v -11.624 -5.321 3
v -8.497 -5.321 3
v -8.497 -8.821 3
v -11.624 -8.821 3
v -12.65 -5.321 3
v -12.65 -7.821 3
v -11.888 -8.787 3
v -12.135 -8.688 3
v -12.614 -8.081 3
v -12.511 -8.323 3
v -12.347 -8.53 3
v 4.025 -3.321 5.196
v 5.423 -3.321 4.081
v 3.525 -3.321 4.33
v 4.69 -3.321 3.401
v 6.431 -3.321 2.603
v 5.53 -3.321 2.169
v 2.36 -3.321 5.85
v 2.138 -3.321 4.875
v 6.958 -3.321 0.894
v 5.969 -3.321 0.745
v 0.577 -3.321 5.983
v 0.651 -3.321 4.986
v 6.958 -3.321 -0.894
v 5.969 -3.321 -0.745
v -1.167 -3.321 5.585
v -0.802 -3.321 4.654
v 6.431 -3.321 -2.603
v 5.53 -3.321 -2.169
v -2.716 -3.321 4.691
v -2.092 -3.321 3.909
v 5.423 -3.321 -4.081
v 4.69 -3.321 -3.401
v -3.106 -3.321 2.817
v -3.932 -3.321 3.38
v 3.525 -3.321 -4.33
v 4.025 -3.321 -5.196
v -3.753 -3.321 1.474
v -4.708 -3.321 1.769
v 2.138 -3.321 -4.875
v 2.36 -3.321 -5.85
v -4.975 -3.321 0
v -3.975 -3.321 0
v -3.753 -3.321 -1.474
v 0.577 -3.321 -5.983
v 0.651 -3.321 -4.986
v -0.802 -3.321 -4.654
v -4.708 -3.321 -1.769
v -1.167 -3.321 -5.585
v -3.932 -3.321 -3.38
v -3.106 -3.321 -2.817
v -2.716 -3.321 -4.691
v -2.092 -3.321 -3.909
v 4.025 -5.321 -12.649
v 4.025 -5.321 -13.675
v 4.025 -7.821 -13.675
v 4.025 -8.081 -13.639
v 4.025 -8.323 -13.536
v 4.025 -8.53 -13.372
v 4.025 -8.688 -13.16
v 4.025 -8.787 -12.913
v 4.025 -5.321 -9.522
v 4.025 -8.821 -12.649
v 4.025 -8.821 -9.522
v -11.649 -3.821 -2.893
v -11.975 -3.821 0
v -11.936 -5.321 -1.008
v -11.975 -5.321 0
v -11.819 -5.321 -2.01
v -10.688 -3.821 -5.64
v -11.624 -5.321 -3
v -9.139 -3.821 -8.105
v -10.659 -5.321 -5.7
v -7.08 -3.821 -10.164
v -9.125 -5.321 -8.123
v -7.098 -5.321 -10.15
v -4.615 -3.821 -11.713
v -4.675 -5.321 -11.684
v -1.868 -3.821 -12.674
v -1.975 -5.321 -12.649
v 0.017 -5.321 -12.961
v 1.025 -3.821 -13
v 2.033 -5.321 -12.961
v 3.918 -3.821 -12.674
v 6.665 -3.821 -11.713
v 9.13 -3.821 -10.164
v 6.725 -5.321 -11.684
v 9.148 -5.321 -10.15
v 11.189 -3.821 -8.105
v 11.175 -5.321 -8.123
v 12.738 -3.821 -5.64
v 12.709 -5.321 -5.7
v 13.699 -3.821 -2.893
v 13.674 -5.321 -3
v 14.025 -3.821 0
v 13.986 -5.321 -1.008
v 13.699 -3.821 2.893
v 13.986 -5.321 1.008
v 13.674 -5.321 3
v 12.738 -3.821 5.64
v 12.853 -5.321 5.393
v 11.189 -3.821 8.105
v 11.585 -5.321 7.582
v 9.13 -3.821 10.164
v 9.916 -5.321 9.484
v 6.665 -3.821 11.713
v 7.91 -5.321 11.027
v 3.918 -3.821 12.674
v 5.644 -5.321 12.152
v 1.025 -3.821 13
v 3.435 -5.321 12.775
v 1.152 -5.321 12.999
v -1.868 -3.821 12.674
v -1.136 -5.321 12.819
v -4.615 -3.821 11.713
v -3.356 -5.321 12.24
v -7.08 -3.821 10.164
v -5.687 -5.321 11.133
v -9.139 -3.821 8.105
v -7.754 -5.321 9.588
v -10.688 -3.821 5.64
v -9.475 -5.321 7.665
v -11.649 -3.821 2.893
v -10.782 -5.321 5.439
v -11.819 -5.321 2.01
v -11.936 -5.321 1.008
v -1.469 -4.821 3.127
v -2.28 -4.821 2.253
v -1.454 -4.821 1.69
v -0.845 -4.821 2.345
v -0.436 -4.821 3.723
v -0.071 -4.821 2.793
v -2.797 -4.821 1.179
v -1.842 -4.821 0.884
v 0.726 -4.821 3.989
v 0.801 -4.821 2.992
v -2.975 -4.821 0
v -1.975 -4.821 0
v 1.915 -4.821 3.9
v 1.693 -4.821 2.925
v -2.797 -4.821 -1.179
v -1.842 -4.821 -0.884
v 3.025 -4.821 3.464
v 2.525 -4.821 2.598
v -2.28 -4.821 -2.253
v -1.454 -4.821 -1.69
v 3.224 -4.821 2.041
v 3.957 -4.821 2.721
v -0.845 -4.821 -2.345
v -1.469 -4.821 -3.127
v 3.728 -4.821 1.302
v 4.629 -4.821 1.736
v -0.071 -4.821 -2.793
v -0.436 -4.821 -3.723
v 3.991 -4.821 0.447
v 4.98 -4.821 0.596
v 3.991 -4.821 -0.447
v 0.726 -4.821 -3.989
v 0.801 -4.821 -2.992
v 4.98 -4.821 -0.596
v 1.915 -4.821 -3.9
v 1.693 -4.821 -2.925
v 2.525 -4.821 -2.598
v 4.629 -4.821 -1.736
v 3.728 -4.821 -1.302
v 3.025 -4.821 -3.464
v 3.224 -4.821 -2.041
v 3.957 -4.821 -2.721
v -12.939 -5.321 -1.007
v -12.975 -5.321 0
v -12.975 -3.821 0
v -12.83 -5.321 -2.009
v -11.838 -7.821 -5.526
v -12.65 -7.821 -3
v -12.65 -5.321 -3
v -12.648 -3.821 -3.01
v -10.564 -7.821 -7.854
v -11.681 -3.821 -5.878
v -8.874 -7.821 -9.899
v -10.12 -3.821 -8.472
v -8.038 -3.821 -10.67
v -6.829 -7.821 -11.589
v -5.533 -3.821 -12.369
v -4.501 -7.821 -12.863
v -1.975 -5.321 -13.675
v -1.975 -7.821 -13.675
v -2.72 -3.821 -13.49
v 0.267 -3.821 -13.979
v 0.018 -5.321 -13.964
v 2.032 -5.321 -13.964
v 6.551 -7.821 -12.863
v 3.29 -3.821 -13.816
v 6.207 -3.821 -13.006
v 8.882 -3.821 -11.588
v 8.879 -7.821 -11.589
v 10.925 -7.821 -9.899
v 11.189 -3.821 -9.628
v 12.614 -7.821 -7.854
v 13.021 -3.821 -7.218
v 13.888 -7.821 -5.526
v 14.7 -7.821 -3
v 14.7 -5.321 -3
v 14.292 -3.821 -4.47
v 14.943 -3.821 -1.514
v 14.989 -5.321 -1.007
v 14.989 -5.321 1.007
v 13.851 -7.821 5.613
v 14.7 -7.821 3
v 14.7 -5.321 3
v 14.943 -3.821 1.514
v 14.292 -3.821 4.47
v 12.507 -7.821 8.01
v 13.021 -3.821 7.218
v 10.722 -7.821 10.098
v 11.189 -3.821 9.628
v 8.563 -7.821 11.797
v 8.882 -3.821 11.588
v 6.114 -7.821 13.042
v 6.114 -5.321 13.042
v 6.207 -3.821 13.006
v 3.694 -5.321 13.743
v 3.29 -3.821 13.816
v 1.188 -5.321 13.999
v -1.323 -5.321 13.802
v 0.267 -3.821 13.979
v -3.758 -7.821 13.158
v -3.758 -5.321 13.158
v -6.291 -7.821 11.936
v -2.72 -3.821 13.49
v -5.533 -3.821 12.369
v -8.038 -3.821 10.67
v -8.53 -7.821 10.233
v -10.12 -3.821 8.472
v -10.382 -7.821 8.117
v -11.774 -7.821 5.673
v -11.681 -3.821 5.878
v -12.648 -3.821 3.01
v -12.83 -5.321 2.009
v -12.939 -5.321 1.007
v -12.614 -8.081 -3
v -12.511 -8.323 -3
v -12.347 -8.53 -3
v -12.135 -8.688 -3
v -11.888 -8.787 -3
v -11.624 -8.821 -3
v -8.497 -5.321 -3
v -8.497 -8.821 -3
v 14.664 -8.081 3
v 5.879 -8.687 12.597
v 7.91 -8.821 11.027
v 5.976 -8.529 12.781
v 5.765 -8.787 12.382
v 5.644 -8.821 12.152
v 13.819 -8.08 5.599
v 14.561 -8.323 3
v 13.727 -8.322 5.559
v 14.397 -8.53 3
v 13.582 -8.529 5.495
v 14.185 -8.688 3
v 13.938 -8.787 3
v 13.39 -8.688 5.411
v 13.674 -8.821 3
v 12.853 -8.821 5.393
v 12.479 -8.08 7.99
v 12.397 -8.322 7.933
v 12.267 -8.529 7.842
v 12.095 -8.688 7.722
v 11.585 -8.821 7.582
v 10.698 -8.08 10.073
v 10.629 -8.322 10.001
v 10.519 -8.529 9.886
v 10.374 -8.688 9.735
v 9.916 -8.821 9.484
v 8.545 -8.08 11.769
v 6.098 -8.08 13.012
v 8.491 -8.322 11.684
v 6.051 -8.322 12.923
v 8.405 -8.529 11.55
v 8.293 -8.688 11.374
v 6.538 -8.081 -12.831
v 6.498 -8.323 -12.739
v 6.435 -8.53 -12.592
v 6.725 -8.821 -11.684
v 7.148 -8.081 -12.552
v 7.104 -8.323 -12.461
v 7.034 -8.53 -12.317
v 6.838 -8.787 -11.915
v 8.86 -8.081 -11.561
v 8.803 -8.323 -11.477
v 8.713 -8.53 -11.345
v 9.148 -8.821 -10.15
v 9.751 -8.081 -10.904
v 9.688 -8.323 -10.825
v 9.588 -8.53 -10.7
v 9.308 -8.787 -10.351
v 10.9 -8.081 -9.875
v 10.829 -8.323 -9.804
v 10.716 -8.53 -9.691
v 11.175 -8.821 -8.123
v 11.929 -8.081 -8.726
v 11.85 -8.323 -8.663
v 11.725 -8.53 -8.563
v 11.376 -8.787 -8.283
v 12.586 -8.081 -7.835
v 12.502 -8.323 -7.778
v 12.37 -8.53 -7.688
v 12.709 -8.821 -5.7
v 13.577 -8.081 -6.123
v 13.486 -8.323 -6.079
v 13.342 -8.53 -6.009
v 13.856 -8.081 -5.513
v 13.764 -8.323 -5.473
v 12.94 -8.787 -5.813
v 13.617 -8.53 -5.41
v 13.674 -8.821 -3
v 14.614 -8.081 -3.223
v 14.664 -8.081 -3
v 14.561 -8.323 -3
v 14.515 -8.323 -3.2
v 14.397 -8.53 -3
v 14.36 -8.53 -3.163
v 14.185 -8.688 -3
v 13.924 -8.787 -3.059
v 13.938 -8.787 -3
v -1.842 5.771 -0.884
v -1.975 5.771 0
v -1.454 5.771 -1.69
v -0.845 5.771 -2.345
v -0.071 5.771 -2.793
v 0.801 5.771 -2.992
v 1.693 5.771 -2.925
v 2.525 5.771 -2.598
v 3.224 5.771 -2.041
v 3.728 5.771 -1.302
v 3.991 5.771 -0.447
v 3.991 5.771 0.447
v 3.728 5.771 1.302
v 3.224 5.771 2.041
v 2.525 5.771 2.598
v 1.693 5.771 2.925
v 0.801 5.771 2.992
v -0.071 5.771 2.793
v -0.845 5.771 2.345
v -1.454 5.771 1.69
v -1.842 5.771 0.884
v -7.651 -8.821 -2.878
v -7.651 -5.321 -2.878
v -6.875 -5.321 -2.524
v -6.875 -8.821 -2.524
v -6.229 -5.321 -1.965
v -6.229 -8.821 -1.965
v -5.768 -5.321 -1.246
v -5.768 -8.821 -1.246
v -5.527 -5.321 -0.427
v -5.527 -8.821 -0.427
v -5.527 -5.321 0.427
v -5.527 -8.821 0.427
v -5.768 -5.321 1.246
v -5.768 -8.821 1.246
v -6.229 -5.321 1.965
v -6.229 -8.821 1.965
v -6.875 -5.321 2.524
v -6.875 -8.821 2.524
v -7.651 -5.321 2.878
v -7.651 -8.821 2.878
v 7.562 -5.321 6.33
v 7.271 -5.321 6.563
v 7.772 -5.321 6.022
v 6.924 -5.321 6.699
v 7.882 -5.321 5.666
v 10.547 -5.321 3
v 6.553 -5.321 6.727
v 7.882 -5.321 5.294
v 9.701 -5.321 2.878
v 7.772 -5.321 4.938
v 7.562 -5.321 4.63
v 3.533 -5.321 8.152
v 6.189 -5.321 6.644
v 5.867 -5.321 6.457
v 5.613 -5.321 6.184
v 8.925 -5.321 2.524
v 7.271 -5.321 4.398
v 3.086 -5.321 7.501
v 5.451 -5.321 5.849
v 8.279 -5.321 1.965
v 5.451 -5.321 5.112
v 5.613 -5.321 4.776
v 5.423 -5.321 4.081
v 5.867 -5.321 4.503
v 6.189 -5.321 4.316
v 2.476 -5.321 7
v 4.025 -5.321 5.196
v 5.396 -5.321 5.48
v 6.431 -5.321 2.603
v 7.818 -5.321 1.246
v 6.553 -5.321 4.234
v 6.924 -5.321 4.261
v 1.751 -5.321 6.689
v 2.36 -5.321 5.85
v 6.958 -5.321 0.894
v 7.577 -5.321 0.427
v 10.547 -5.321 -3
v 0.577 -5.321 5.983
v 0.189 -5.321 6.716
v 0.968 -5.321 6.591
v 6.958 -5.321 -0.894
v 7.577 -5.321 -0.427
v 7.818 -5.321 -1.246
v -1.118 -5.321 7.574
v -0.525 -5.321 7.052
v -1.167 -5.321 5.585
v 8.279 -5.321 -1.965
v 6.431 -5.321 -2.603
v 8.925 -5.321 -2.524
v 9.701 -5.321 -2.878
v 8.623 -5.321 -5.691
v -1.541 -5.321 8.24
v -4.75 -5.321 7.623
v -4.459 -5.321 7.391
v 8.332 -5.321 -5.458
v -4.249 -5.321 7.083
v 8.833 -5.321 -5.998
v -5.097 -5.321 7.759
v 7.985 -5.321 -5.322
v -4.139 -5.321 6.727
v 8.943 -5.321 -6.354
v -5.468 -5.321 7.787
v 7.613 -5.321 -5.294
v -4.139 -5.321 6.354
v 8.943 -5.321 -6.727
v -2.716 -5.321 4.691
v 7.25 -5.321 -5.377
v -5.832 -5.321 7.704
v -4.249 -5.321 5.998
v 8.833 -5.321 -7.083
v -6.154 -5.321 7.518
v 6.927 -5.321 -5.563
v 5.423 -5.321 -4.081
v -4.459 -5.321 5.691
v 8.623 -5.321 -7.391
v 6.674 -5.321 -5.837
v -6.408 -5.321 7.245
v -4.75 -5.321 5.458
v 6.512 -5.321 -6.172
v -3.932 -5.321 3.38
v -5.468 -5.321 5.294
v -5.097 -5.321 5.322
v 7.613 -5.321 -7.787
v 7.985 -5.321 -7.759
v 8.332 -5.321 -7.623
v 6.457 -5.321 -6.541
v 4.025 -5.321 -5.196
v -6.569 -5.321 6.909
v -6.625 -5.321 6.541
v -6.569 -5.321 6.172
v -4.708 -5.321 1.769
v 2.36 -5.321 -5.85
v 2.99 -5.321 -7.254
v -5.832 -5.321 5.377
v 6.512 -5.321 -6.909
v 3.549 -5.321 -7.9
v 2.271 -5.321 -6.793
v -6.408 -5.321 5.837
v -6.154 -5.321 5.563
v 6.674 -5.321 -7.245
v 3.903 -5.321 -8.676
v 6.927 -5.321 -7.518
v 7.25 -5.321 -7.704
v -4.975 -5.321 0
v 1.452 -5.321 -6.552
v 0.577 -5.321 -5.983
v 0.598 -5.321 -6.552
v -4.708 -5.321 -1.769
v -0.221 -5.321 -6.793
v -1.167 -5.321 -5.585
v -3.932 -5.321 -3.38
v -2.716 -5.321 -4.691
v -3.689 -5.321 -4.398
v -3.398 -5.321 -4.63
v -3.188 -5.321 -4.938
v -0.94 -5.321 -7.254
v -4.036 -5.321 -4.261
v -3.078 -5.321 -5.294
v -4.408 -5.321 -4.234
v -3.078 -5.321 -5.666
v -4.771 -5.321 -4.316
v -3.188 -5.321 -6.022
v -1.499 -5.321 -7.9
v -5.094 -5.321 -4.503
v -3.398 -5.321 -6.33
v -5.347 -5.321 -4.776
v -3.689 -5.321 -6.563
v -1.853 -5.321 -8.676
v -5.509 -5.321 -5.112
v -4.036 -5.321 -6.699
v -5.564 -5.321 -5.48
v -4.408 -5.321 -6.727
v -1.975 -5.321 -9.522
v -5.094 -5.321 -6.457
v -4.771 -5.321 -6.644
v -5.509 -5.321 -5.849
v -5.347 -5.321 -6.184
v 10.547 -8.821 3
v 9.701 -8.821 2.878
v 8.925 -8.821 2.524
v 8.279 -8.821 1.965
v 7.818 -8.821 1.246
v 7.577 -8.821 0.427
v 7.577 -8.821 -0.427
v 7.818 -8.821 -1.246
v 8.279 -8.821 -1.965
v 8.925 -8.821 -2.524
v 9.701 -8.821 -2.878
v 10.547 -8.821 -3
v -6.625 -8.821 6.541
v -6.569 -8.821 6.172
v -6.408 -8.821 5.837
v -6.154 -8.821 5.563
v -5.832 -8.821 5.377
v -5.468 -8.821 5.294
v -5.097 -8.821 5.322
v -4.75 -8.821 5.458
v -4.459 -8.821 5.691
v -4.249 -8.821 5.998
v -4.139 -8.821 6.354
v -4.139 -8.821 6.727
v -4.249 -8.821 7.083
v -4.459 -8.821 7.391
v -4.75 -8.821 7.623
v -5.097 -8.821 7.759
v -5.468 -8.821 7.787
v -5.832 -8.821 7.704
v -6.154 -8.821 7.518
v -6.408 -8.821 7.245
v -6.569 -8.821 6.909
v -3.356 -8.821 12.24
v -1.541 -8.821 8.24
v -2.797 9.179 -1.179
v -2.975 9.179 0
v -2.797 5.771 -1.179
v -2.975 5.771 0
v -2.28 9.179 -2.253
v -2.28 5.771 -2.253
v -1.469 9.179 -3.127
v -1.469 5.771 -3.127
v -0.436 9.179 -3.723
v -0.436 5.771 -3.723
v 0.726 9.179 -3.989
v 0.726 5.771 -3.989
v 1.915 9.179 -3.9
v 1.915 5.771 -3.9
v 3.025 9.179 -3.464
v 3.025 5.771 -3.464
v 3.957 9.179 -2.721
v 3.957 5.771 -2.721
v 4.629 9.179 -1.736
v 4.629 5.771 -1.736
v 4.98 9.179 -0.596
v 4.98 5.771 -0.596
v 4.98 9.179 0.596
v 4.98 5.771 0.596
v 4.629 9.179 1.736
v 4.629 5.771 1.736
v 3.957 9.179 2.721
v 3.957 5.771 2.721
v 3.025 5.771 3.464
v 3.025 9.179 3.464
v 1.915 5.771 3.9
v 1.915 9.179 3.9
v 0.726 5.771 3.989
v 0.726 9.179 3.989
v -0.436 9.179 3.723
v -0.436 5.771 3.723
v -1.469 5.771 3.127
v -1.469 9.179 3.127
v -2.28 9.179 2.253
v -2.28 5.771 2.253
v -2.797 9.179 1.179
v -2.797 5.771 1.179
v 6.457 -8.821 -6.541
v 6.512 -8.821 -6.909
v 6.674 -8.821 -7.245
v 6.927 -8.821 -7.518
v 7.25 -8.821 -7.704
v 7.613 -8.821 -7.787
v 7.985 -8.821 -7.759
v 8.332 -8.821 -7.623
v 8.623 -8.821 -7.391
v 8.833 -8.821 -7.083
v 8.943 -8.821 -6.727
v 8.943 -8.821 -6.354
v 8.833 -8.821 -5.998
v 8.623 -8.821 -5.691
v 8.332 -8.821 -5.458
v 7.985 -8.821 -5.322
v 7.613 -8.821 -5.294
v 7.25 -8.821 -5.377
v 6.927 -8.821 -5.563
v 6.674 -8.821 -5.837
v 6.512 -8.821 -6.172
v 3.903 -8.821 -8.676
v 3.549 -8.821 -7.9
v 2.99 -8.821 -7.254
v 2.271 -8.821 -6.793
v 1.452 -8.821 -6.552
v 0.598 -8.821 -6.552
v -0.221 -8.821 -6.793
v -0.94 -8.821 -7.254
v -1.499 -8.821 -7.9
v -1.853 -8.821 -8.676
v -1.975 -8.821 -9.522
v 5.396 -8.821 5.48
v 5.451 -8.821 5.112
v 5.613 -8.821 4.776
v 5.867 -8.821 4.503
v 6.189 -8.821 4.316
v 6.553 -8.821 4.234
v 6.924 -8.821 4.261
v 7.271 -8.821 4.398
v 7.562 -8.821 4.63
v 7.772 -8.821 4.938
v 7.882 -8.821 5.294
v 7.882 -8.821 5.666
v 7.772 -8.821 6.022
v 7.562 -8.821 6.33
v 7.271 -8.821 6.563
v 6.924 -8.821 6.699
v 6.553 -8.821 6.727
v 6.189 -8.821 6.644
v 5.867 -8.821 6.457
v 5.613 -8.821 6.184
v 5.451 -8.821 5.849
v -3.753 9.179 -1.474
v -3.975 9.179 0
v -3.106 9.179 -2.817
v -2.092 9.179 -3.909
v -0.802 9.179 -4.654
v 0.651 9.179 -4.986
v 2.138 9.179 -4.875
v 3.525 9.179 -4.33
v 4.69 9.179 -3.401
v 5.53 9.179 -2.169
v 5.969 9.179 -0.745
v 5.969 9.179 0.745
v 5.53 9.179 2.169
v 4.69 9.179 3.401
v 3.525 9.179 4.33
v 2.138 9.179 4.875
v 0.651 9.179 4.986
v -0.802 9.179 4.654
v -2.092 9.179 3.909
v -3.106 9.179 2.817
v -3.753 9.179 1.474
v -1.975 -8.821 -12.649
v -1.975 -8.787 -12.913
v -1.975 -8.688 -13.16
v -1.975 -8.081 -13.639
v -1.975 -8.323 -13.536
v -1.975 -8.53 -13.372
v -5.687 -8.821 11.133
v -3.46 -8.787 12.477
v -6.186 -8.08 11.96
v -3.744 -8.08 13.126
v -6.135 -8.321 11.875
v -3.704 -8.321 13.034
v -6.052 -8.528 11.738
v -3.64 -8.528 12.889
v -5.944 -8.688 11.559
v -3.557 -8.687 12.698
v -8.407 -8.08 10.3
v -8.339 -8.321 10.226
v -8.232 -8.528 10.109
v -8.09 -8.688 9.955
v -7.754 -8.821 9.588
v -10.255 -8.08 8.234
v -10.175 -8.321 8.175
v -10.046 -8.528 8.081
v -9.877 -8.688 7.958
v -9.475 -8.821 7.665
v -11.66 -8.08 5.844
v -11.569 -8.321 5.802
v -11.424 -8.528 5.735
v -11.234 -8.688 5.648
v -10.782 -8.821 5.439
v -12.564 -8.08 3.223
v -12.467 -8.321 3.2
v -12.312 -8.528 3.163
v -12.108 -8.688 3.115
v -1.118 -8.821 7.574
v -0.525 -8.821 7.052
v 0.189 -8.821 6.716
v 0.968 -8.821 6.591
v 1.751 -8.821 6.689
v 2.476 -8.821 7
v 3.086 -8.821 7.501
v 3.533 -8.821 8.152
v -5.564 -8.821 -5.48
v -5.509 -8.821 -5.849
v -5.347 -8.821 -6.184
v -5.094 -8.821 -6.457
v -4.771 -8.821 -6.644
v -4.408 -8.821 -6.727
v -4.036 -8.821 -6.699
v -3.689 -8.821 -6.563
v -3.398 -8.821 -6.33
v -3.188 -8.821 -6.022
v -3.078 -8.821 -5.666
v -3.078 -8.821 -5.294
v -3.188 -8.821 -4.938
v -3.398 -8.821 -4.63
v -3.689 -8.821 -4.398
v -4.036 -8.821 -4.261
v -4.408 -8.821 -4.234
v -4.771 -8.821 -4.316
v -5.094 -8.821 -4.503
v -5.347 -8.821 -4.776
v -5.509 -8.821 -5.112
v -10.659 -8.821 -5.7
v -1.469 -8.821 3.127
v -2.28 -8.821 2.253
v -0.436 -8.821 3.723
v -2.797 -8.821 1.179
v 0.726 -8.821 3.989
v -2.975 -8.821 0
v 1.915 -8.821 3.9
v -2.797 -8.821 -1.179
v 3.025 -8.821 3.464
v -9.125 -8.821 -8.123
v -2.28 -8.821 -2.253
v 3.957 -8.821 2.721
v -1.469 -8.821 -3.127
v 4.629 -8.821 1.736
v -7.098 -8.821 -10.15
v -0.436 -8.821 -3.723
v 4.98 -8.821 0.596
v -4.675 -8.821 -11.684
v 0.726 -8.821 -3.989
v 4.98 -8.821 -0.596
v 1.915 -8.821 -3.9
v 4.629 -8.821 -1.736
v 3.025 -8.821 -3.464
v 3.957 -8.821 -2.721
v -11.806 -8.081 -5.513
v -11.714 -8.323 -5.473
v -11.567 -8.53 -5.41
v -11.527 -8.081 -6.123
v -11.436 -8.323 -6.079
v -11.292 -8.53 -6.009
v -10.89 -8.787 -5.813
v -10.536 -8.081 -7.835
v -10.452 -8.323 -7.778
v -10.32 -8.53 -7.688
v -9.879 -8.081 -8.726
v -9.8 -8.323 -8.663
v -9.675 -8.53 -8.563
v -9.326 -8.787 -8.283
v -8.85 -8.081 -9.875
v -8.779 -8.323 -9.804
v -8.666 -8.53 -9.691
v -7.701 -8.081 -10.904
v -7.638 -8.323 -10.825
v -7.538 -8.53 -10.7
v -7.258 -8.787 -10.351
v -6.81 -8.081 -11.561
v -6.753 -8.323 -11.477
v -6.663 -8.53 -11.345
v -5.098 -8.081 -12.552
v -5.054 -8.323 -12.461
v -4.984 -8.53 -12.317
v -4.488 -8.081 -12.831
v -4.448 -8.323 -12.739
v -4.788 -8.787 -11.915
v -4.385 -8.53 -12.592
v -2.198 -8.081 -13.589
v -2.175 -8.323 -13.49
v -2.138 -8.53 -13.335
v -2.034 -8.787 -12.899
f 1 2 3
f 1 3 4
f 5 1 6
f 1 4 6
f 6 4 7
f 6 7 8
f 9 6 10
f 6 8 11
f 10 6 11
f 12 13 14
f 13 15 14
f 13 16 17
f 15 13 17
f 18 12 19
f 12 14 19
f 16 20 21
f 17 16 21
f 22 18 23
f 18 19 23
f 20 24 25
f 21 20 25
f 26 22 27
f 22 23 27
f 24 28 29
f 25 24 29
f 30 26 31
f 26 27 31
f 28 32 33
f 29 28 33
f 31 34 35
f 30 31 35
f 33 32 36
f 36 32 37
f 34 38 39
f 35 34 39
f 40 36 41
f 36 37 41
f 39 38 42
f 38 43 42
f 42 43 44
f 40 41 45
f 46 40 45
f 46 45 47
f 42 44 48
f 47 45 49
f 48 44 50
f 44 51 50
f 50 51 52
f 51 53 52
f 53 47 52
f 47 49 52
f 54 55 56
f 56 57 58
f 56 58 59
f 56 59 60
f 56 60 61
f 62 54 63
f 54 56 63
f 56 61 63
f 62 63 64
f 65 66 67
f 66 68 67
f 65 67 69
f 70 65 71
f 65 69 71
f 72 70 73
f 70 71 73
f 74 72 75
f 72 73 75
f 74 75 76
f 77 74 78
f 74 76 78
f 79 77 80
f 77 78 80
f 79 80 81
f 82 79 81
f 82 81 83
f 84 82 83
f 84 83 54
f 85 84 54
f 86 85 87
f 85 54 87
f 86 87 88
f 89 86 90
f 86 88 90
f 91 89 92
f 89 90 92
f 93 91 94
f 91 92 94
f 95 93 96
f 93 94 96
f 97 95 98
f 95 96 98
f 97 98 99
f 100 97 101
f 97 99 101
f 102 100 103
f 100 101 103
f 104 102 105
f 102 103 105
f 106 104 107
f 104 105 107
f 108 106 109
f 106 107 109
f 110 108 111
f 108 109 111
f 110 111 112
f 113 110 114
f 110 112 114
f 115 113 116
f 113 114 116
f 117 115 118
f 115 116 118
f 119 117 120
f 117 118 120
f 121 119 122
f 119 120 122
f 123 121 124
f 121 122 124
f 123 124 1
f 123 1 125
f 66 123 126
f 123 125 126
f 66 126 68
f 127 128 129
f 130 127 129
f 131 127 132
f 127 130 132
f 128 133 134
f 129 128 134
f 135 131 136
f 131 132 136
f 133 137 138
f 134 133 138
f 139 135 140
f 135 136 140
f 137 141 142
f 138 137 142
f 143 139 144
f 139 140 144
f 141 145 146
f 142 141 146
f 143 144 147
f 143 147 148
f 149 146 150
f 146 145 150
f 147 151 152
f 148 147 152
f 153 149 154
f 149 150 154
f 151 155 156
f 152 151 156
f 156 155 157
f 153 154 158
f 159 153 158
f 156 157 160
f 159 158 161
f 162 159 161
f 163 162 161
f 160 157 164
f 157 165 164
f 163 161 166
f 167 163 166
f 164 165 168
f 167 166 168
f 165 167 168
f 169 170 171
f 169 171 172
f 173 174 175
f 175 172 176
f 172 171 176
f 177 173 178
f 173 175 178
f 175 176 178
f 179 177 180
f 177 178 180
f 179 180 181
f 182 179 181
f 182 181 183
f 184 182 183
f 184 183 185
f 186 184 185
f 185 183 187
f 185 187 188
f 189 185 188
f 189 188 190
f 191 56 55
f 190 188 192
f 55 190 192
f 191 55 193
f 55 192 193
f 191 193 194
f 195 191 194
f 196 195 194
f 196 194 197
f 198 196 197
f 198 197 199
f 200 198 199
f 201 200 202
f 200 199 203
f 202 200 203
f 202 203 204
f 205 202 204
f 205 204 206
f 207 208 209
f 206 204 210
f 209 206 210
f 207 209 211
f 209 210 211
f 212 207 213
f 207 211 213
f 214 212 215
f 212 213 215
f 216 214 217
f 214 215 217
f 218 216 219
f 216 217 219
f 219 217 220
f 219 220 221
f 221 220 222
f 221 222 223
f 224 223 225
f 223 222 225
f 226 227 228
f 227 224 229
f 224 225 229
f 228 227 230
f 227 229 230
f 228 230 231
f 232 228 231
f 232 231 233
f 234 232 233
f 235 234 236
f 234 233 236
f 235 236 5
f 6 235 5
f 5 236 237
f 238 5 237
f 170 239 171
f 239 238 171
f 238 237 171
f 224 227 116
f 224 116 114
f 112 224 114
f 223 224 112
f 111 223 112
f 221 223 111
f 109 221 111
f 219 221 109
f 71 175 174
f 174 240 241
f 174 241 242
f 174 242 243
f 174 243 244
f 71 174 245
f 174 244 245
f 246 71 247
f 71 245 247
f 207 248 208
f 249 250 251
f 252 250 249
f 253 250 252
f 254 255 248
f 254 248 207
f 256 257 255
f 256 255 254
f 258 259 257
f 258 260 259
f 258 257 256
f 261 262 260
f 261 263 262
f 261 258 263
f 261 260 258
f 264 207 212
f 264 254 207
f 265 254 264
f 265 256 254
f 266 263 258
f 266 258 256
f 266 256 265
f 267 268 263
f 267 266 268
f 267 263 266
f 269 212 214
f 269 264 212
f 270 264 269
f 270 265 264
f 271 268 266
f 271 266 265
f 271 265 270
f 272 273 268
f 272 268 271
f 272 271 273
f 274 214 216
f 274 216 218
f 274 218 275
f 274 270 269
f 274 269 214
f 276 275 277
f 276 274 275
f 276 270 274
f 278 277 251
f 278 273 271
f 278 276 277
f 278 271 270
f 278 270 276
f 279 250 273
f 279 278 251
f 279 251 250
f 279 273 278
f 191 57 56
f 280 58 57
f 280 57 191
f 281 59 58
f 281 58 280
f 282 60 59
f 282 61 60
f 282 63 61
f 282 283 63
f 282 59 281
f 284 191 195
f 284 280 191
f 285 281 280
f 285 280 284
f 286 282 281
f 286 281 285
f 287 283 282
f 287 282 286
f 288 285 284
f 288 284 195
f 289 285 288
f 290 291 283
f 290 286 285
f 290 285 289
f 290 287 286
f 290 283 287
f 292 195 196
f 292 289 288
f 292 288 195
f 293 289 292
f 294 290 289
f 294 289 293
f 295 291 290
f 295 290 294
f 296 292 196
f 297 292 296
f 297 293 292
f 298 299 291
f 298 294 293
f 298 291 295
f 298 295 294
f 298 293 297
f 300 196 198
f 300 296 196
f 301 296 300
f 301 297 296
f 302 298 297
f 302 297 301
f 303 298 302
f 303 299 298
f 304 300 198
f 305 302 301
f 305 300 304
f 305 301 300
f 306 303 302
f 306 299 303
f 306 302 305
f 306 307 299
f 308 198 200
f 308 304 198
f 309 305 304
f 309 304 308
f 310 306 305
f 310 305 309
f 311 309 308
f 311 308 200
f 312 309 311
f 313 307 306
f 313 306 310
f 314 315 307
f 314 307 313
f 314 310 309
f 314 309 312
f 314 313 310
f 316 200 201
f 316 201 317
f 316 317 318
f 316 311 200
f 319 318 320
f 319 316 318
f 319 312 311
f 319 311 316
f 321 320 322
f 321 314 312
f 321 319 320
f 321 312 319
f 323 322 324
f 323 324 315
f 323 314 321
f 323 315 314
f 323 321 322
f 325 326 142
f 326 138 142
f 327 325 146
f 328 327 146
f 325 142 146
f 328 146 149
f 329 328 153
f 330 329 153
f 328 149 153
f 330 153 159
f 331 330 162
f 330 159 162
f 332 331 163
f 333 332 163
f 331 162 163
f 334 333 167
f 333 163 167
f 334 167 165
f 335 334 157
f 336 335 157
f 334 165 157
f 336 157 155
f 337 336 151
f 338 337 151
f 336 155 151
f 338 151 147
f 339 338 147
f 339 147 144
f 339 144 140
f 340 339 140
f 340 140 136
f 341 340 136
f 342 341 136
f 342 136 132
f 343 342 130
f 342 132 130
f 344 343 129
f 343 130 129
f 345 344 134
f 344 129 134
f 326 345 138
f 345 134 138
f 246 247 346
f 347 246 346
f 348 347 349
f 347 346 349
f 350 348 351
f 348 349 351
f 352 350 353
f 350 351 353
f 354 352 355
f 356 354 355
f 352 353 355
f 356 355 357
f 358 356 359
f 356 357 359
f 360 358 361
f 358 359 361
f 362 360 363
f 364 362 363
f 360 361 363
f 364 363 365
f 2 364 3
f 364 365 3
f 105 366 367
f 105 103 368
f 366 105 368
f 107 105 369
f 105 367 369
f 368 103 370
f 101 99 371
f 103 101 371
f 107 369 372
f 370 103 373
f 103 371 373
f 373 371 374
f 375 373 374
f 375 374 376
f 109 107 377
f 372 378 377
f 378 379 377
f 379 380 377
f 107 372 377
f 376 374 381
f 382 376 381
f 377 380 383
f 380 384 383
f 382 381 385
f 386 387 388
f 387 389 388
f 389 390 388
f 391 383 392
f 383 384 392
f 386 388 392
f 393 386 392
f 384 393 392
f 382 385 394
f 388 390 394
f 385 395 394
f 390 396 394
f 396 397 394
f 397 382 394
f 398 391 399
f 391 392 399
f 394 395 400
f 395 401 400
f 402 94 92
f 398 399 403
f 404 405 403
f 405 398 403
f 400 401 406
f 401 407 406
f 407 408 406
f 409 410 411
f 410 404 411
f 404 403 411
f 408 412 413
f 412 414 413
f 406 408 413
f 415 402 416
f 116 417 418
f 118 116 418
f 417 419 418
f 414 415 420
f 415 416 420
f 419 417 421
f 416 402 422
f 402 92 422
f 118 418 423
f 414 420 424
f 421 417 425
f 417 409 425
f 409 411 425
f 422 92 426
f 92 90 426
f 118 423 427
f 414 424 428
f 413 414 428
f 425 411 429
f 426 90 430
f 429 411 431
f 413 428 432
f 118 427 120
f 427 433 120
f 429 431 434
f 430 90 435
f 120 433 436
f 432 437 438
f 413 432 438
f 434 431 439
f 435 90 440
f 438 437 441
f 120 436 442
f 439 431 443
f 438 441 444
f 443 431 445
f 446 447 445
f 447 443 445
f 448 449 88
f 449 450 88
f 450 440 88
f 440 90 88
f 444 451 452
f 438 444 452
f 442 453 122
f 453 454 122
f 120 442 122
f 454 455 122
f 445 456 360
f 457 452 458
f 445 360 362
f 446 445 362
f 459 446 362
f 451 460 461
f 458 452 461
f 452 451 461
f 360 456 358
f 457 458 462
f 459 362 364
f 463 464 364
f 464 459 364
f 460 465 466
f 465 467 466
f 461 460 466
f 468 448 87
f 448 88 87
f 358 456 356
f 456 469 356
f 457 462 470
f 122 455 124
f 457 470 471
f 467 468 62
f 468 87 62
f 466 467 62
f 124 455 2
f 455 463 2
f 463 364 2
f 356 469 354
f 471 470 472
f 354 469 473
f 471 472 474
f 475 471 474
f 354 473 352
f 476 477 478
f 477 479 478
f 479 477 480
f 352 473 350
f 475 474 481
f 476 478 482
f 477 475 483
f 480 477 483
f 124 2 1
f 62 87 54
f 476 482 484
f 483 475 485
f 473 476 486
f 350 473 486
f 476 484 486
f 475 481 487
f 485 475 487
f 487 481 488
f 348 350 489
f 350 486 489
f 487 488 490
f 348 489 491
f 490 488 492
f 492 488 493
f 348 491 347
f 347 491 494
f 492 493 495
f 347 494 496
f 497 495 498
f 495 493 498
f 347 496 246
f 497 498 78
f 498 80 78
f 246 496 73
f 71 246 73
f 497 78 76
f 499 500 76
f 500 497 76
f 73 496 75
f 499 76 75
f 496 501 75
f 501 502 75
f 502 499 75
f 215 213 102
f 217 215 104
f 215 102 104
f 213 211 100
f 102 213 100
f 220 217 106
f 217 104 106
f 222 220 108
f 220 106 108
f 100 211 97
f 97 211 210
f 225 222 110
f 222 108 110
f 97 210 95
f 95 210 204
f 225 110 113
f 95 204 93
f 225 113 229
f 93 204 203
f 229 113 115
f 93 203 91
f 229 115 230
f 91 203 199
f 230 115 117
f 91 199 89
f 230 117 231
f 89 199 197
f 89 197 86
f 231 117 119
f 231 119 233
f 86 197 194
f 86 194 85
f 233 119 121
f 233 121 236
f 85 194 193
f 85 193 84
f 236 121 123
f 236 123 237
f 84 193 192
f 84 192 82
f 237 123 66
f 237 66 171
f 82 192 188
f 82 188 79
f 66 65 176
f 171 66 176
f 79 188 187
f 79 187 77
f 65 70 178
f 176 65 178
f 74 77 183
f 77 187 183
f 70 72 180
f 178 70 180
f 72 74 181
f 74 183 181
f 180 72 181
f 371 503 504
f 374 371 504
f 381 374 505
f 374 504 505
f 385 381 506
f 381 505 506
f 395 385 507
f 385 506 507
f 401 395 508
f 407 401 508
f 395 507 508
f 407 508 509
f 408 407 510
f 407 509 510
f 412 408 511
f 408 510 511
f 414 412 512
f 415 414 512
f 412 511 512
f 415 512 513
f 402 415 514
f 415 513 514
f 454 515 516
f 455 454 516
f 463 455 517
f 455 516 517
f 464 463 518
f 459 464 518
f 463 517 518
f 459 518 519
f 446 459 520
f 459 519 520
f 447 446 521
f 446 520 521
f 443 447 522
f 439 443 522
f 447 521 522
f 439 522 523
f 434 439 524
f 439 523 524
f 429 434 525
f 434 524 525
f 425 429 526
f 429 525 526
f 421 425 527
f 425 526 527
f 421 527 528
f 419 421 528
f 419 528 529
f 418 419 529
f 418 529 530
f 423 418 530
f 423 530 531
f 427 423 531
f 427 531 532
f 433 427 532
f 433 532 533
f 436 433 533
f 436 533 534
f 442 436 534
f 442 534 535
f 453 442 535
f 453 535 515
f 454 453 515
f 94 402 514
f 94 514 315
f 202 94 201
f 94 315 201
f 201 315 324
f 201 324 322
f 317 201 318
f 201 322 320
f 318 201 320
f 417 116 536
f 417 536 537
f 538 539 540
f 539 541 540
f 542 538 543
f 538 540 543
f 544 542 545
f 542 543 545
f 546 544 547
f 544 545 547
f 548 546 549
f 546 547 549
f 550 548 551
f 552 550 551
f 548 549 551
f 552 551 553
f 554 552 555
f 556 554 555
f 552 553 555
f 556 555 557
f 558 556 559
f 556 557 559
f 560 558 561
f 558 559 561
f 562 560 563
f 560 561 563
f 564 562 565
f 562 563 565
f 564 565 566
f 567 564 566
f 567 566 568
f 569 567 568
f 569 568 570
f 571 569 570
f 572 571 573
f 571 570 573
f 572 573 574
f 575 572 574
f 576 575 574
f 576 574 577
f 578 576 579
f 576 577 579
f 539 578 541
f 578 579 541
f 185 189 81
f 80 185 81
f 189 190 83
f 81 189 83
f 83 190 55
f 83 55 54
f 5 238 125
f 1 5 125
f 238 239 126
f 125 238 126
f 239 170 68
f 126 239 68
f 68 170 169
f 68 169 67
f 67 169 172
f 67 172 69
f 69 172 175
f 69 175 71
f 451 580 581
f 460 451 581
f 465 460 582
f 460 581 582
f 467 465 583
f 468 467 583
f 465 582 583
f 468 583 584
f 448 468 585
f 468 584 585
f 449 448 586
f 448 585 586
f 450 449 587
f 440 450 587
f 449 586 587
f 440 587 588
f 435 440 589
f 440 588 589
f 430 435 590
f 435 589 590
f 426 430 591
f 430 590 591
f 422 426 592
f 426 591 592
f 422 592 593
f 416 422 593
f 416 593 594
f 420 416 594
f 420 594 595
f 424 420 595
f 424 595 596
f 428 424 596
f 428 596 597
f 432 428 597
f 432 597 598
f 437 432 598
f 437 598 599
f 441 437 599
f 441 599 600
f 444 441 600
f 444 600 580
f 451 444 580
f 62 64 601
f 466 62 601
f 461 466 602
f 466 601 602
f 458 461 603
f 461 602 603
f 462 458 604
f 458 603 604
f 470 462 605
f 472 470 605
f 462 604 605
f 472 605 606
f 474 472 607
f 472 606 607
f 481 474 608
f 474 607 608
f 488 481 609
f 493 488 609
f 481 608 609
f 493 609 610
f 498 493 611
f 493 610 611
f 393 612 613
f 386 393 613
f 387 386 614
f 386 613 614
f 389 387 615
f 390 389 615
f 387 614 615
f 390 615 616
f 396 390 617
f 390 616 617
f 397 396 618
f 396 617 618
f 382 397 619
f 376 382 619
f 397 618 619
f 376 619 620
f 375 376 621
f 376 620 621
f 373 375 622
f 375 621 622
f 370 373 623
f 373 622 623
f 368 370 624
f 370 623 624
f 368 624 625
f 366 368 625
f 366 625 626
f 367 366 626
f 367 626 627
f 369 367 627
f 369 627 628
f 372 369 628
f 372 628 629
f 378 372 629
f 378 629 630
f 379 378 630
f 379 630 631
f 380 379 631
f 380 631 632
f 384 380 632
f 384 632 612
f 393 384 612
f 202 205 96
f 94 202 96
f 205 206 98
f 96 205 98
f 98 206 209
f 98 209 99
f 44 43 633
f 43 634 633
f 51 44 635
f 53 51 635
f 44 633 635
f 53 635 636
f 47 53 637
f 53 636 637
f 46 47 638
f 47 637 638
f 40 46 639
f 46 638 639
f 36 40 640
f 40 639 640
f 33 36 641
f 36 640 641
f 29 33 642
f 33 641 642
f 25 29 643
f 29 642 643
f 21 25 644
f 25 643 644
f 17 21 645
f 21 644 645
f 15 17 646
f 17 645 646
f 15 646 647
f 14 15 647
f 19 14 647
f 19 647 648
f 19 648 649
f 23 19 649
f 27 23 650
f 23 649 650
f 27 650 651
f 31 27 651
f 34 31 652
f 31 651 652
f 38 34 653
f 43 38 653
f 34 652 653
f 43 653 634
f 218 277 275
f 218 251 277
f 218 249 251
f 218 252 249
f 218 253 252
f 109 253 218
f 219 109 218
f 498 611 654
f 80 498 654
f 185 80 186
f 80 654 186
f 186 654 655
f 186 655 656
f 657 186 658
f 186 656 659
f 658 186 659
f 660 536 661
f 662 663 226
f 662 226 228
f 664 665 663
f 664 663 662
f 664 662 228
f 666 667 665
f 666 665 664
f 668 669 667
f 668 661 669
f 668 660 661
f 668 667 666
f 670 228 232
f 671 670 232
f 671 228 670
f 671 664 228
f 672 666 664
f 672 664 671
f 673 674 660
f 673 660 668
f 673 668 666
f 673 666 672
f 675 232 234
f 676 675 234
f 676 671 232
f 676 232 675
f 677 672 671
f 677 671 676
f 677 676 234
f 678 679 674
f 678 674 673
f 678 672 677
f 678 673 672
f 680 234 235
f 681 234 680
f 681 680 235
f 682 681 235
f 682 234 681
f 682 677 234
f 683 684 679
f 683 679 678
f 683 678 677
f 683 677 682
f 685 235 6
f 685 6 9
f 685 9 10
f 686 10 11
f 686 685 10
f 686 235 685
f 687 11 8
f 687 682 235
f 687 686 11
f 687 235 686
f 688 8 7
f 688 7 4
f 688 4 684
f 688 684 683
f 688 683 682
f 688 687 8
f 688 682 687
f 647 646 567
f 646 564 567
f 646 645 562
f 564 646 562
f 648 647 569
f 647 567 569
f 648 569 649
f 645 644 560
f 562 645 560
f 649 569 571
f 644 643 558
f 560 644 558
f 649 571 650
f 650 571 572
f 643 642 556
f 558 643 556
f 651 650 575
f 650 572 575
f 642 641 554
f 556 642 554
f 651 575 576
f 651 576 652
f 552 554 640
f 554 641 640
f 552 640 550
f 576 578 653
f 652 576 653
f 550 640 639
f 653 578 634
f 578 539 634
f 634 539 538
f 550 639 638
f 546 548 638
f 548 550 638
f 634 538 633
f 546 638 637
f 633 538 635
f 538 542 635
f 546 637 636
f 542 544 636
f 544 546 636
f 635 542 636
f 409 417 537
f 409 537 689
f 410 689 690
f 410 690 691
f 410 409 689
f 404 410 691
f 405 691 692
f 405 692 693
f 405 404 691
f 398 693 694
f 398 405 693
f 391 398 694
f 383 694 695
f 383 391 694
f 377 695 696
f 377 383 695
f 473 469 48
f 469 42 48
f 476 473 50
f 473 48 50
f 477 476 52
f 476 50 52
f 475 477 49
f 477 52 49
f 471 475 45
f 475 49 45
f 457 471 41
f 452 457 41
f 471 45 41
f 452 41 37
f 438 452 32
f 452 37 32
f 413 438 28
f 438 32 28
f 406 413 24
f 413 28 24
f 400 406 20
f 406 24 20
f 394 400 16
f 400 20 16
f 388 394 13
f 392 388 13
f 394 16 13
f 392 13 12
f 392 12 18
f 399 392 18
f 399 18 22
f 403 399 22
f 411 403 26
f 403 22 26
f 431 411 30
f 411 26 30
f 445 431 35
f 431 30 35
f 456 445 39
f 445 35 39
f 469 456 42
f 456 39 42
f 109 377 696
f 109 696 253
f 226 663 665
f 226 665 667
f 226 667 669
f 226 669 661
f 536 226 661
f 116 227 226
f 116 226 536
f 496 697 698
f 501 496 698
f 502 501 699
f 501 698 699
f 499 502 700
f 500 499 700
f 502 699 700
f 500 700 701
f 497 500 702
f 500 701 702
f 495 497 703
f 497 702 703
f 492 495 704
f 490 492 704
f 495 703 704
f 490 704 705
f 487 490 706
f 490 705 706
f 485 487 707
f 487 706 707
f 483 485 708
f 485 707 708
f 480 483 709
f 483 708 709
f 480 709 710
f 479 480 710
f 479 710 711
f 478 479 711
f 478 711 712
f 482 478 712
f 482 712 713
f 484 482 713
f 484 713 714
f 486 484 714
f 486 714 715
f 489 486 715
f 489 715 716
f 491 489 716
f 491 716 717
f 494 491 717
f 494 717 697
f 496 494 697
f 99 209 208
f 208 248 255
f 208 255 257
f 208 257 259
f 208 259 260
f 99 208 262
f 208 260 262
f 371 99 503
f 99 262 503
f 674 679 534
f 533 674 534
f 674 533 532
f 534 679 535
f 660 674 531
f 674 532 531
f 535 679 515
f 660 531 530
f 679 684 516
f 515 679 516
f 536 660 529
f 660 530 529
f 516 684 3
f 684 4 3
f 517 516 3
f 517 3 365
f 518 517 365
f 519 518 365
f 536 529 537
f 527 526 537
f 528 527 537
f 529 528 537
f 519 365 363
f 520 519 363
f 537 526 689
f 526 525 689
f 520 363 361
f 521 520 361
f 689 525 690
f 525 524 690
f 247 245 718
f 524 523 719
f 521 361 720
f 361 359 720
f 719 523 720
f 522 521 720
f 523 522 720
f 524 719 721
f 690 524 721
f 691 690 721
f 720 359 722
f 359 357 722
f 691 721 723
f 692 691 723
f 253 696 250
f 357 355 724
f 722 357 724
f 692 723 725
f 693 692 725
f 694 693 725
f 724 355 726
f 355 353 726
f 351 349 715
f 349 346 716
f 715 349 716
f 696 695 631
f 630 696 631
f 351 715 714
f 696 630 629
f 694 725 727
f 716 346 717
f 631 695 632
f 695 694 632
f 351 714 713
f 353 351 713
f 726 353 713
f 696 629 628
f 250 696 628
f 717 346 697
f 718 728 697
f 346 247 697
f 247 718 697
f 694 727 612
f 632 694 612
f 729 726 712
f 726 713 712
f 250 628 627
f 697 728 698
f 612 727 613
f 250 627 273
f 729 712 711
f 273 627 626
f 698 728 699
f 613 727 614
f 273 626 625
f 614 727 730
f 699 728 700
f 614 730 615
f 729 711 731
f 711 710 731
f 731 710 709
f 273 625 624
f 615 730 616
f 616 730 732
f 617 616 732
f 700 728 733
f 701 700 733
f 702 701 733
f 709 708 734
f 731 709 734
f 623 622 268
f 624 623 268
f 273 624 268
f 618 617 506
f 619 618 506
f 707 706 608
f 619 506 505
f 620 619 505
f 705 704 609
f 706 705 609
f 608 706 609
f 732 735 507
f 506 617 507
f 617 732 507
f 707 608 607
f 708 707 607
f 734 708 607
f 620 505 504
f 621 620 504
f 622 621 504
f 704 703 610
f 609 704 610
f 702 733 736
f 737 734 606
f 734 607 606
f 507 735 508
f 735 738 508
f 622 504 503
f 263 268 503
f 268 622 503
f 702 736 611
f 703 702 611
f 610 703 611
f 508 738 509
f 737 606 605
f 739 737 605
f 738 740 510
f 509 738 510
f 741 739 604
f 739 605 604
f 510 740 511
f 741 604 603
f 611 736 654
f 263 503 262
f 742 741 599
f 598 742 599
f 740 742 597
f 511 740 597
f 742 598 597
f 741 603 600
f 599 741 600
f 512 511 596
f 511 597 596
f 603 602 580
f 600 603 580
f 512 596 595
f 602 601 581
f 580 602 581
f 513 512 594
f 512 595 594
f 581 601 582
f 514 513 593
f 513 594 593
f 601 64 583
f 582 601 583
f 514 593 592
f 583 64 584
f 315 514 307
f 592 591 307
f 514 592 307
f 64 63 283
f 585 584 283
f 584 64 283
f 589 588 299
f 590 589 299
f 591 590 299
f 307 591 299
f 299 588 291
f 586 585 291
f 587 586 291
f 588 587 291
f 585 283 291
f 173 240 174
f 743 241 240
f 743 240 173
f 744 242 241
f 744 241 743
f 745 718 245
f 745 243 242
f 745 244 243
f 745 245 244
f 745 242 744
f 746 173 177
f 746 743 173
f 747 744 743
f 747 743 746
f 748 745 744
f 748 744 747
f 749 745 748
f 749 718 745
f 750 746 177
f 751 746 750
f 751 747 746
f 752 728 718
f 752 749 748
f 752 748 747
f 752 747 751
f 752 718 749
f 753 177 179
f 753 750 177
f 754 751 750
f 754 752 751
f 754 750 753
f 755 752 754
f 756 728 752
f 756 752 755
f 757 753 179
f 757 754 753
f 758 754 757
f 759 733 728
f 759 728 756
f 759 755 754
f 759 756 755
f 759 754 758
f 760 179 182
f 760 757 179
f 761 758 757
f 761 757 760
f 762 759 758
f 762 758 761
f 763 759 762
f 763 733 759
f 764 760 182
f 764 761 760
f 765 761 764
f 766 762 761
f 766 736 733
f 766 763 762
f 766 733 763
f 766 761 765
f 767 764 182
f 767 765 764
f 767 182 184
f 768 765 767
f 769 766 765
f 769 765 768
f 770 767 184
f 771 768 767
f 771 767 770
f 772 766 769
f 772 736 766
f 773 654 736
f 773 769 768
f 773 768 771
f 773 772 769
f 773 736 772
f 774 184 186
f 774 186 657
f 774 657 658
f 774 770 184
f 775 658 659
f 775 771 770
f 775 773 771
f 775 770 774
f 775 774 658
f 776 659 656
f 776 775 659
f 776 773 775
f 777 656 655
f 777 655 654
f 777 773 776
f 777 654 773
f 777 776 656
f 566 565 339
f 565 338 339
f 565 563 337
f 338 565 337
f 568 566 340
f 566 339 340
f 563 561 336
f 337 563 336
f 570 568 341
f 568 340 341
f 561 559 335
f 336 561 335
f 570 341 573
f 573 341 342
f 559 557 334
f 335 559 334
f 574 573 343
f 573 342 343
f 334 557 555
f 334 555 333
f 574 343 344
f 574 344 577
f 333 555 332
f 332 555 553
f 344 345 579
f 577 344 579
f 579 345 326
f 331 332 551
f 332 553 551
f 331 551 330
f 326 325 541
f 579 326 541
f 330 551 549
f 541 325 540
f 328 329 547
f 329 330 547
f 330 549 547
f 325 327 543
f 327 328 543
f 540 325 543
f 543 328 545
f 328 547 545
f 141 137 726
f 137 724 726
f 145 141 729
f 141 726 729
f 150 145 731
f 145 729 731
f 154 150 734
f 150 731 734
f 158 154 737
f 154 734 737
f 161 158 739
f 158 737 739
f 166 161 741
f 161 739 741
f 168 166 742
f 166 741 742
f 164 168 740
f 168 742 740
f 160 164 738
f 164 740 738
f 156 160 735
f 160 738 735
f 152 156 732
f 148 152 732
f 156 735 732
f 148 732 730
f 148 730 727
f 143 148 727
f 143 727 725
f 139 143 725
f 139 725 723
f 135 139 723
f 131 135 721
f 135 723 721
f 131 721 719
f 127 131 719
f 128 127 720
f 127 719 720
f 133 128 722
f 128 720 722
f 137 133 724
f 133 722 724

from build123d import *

# Parameters (mm, degrees)
CONG_1_R                     = 1
ENL_V_MAT_EXTRU_1_REACH      = 29.308
R_P_TITION_CIRCULAIRE2_COUNT = 3
R_P_TITION_CIRCULAIRE2_ANGLE = 180
ENL_V_START                  = -3.5
ENL_V_MAT_EXTRU_2_DEPTH      = 3.5
TROU_TARAUD_M3X0_52_D        = 2.5


with BuildPart() as part:
    # Esquisse3 → Révolution1 (revolve)
    with BuildSketch(Plane.XY):
        Polygon((-12.974994046, -8.820980619), (-12.974994046, -3.820980619), (-11.974994046, -3.820980619), (-11.974994046, -5.320980619), (-4.974994046, -5.320980619), (-4.974994046, -3.320980619), (-3.974994046, -3.320980619), (-3.974994046, 9.179019381), (-2.974994046, 9.179019381), (-2.974994046, 5.770549628), (-1.974994046, 5.770549628), (-1.974994046, -4.820980619), (-2.974994046, -4.820980619), (-2.974994046, -8.820980619), align=None)
    revolve(axis=Axis((1.025005954, 13.743921907, 0), (0, -1, 0)))

    # Congé1
    cong_1_edges = [part.edges().sort_by_distance(p)[0] for p in [
        (15.025005954, -8.820980619, 0),
    ]]
    fillet(cong_1_edges, radius=CONG_1_R)

    # Enlèv. mat.-Extru.1: up to this face of the body (flat: up to its plane)
    enl_v_mat_extru_1_end = Plane(part.part.faces().sort_by_distance((13.657310428, -5.320980619, 0))[0])
    # Esquisse5 → Enlèv. mat.-Extru.1 (cut, up to the picked face)
    with BuildSketch(Plane.XZ.offset(8.820980619), mode=Mode.PRIVATE) as enl_v_mat_extru_1_sk1:
        with BuildLine():
            Line((13.674116595, 3), (10.546683691, 3))
            ThreePointArc((10.546683691, 3), (7.546683691, 0), (10.546683691, -3))
            Line((10.546683691, -3), (13.674116595, -3))
            Line((13.674116595, -3), (14.699800285, -3))
            Line((14.699800285, -3), (15.031061769, -3))
            ThreePointArc((15.031061769, -3), (15.351470019, 0), (15.031061769, 3))
            Line((15.031061769, 3), (14.699800285, 3))
            Line((14.699800285, 3), (13.674116595, 3))
        make_face()
    enl_v_mat_extru_1_tool1 = split(extrude(enl_v_mat_extru_1_sk1.sketch, amount=-ENL_V_MAT_EXTRU_1_REACH, mode=Mode.PRIVATE), bisect_by=enl_v_mat_extru_1_end, keep=Keep.BOTH, mode=Mode.PRIVATE)
    enl_v_mat_extru_1 = enl_v_mat_extru_1_tool1.solids().sort_by(Axis((11.686689, -8.820981, 0), (0, 1, 0)))[0]
    add(enl_v_mat_extru_1, mode=Mode.SUBTRACT)

    # Répétition circulaire2: Enlèv. mat.-Extru.1 ×3 about axis
    r_p_tition_circulaire2_axis = Axis((1.025005954, 0, 0), (0, 1, 0))
    for i in range(1, R_P_TITION_CIRCULAIRE2_COUNT):
        add(enl_v_mat_extru_1.rotate(r_p_tition_circulaire2_axis, i * R_P_TITION_CIRCULAIRE2_ANGLE / (R_P_TITION_CIRCULAIRE2_COUNT - 1)), mode=Mode.SUBTRACT)

    # Esquisse7 → Enlèv. mat.-Extru.2 (cut)
    with BuildSketch(Plane.XZ.offset(8.820980619).offset(ENL_V_START)):
        with BuildLine():
            Line((-3.356038211, 12.2395446), (-1.541479015, 8.2395446))
            ThreePointArc((-1.541479015, 8.2395446), (0.968033239, 6.591412228), (3.533049808, 8.151759008))
            Line((3.533049808, 8.151759008), (5.643961789, 12.151759008))
            Line((5.643961789, 12.151759008), (6.71991785, 14.19060491))
            ThreePointArc((6.71991785, 14.19060491), (1.235603593, 15.289242553), (-4.276890033, 14.34207754))
            Line((-4.276890033, 14.34207754), (-3.356038211, 12.2395446))
        make_face()
    extrude(amount=ENL_V_MAT_EXTRU_2_DEPTH, mode=Mode.SUBTRACT)

    # Trou taraudé M3x0.52 (through all)
    with Locations(Plane(origin=(-5.37489391, -5.320980619, 6.540737726), x_dir=(1, 0, 0), z_dir=(0, 1, 0))):
        with Locations((0, 0), (1.060660172, 12.02081528), (12.020815281, 1.060660172), (13.081475452, 13.081475452)):
            Hole(TROU_TARAUD_M3X0_52_D / 2)


solid = part.part
